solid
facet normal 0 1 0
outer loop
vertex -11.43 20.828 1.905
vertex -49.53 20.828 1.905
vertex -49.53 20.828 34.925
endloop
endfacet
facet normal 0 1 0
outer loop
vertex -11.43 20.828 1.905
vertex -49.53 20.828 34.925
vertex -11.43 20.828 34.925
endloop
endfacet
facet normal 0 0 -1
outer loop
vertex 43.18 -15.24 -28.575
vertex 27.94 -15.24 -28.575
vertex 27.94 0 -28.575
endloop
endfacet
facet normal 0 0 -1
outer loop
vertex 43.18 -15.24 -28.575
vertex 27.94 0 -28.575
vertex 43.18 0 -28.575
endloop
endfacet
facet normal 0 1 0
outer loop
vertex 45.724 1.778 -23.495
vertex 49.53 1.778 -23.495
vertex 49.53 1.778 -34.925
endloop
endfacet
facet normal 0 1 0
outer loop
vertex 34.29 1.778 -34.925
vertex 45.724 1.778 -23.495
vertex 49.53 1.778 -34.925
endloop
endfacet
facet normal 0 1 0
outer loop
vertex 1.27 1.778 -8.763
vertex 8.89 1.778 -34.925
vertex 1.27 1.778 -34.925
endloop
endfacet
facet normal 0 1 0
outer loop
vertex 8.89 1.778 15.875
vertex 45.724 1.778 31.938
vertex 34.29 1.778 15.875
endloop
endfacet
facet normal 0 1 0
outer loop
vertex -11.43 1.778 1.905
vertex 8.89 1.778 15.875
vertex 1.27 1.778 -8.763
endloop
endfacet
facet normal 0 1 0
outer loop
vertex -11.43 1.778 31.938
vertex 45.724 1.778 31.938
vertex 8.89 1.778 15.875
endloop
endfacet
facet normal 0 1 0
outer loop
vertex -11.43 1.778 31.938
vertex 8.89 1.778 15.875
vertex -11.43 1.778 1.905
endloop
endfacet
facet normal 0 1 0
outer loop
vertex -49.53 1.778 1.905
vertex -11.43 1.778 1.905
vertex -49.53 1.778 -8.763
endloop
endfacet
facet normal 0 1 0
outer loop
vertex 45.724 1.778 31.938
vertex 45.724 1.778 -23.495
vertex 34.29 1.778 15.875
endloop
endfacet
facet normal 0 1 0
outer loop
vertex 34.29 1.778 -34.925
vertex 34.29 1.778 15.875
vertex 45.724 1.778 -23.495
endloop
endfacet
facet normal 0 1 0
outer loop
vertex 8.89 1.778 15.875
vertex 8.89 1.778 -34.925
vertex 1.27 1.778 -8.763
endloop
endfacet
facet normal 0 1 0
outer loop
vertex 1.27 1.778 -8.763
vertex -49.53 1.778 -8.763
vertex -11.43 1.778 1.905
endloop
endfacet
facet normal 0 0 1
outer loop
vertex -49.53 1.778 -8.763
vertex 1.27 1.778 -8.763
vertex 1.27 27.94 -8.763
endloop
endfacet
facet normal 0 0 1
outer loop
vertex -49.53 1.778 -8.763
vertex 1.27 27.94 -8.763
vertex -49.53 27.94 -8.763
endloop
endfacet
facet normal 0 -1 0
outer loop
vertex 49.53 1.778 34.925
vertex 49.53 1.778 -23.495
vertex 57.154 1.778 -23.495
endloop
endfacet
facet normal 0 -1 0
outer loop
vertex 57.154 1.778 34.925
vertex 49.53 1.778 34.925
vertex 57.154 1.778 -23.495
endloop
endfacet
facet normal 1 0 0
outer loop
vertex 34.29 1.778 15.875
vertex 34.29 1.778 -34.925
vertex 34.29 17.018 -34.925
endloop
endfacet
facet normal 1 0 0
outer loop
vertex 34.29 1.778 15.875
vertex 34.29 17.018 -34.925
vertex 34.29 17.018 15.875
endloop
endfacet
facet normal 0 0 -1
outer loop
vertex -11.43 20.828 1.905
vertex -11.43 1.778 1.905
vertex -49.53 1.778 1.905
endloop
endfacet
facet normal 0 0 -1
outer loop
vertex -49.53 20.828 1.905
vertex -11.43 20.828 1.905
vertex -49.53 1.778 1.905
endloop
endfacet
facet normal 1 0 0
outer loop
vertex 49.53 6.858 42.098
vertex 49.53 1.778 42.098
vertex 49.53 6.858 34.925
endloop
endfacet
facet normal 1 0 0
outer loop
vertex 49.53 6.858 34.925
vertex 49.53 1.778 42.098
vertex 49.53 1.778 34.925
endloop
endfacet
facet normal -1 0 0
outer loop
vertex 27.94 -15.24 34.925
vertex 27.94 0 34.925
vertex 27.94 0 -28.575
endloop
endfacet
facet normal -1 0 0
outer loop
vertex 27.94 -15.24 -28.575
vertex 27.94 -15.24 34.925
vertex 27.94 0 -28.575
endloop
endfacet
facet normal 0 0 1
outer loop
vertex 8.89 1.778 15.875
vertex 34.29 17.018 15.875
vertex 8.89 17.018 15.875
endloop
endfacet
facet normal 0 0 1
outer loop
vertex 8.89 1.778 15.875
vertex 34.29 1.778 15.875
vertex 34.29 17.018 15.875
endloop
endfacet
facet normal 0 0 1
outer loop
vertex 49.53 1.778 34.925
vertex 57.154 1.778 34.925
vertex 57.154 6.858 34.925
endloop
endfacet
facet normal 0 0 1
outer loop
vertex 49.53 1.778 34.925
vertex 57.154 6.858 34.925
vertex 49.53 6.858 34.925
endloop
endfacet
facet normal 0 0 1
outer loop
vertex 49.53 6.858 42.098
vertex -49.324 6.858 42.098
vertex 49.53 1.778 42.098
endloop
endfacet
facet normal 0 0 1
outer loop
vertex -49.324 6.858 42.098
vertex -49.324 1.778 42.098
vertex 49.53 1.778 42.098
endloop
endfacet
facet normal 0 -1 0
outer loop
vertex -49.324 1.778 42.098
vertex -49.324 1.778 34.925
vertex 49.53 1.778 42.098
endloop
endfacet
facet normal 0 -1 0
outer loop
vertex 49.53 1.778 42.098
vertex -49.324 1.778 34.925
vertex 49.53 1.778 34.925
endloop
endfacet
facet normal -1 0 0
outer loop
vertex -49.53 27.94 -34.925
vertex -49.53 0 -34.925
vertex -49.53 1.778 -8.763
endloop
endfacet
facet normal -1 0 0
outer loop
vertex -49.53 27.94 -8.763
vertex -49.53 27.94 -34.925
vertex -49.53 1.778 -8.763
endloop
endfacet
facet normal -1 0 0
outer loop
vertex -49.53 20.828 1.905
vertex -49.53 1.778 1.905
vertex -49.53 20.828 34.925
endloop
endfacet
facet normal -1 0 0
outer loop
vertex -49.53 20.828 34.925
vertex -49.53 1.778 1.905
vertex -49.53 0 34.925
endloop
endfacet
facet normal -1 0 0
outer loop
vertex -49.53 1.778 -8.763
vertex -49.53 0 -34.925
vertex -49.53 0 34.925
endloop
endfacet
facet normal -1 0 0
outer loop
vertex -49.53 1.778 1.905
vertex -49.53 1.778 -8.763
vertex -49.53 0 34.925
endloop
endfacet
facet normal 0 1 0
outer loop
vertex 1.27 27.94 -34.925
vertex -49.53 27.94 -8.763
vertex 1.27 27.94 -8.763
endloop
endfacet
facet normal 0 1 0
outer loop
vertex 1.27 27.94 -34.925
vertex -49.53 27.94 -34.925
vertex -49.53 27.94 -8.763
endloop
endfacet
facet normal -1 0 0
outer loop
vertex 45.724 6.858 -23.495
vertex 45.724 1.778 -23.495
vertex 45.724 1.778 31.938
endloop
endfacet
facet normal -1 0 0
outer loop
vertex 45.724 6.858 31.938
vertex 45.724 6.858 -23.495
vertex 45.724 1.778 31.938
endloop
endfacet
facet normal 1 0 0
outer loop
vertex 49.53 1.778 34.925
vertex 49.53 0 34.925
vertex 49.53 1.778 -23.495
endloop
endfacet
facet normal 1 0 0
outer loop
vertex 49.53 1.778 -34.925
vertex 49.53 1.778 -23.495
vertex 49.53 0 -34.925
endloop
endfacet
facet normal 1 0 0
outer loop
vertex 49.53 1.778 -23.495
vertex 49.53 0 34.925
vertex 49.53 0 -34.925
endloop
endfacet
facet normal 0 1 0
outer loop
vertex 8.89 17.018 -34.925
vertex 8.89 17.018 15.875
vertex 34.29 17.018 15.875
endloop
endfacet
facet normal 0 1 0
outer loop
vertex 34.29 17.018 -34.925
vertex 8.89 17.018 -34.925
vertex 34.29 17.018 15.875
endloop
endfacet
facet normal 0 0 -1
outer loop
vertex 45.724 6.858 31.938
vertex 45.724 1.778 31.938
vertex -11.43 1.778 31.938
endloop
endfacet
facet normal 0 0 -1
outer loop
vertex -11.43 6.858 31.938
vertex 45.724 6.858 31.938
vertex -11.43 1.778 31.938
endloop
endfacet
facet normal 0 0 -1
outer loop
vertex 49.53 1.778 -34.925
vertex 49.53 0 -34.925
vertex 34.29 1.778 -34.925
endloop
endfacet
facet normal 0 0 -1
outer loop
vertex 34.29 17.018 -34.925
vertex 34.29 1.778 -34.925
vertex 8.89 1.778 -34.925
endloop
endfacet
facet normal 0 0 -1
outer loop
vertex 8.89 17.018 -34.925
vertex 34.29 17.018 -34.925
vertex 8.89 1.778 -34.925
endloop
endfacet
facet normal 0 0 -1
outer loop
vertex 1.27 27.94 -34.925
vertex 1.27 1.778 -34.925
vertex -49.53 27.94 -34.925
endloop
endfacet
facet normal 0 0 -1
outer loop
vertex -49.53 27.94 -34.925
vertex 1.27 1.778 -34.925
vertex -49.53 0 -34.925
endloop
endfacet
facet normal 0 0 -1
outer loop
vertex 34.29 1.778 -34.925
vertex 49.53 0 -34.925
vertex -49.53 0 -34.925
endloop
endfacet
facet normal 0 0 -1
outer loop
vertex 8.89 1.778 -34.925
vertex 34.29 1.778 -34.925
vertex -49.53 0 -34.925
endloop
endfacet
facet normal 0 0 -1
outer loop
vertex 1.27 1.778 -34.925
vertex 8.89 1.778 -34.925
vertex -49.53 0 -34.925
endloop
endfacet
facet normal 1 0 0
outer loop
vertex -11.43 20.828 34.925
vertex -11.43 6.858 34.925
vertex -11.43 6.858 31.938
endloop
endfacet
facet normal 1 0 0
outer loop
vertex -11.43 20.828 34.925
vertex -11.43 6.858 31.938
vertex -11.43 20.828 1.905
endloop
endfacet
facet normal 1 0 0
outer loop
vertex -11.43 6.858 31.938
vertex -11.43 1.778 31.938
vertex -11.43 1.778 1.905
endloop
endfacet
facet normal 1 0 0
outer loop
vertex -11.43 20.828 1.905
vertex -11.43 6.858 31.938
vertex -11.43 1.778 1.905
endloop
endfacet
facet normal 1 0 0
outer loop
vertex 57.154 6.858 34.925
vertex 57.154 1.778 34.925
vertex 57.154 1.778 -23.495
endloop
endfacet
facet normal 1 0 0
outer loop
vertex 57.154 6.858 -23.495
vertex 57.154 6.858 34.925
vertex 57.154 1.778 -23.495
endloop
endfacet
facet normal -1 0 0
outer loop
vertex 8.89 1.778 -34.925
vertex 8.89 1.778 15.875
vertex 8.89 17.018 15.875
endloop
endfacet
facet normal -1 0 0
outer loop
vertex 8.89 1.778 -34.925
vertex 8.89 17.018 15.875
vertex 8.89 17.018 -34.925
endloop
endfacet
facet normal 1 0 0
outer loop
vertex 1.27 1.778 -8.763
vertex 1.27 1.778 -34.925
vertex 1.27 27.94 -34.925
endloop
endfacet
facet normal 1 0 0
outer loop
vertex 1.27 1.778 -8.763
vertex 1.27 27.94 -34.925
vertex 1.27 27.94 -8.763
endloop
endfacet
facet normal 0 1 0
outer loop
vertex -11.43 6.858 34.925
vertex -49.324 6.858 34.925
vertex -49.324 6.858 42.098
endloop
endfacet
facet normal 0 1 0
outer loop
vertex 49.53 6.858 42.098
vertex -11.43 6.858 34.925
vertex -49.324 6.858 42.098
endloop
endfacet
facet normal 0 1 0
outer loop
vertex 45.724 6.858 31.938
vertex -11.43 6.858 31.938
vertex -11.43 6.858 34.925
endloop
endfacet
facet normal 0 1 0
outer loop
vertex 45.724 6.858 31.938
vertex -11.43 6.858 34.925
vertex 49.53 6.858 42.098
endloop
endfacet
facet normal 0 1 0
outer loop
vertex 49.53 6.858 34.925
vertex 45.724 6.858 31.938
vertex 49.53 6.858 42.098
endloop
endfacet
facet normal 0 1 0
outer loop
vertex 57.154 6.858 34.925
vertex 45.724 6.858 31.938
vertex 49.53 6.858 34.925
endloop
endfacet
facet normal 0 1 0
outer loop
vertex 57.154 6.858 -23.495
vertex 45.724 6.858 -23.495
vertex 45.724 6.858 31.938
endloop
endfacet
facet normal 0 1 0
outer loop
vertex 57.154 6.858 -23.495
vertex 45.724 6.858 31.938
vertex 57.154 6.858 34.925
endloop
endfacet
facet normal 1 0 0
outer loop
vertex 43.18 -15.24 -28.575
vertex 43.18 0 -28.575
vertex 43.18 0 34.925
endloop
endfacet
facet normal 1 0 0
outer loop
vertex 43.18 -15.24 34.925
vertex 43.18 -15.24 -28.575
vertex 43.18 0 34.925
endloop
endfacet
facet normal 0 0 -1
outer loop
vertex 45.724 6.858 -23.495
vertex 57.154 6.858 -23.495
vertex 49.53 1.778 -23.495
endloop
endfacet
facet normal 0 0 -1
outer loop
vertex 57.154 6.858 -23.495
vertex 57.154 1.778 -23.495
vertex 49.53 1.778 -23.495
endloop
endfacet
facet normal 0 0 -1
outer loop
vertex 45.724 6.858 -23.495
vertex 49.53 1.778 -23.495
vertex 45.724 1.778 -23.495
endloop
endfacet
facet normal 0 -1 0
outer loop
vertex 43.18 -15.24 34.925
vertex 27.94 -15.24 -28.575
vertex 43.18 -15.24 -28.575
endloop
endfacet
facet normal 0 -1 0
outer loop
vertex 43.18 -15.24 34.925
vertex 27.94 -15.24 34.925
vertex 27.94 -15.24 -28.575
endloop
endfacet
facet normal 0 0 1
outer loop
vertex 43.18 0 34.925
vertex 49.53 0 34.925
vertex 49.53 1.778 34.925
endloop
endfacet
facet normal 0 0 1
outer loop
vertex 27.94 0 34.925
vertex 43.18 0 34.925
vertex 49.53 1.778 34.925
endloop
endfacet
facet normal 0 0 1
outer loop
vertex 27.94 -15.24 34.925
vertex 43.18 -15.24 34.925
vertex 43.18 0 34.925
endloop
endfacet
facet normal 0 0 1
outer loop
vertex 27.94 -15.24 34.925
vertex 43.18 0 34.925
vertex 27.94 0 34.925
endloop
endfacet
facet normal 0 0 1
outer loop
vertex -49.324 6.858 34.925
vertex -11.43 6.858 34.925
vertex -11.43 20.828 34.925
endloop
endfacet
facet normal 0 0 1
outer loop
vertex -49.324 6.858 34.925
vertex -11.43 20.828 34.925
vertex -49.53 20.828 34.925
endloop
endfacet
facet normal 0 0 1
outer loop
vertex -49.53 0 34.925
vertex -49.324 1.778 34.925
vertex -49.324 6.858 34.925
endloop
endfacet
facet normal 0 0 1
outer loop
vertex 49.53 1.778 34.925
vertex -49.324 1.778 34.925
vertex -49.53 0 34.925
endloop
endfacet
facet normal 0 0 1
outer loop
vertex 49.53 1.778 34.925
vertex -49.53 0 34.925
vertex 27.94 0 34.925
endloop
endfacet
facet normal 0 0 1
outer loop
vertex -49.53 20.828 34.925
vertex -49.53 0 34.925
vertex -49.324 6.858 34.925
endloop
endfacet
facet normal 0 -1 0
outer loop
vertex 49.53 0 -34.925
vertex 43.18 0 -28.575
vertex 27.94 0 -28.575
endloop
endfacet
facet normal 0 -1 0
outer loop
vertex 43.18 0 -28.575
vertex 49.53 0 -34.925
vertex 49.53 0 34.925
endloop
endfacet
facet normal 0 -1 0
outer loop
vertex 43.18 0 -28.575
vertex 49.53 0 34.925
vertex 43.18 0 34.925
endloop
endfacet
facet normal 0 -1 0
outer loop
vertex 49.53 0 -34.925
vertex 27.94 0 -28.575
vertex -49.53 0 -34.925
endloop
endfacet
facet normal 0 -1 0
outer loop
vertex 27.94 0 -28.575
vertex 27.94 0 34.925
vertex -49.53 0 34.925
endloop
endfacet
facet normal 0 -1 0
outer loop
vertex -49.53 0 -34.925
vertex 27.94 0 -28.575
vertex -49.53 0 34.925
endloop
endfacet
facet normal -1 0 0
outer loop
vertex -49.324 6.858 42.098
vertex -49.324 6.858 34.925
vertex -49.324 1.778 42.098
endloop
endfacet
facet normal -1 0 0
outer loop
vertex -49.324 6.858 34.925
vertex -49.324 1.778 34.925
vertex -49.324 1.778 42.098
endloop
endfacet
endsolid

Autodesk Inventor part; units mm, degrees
ref_plane "YZ Plane" through (0, 0, 0) normal (1, 0, 0) x (0, 1, 0)
ref_plane "XZ Plane" through (0, 0, 0) normal (0, 1, 0) x (-1, 0, 0)
ref_plane "XY Plane" through (0, 0, 0) normal (0, 0, 1) x (1, 0, 0)
sketch "Sketch1" plane through (0, 0, 0) normal (0, 1, 0) x (-1, 0, 0)
  line L0 (49.53, 34.925) -> (-49.53, 34.925)
  line L1 (-49.53, 34.925) -> (-49.53, -34.925)
  line L2 (-49.53, -34.925) -> (49.53, -34.925)
  line L3 (49.53, -34.925) -> (49.53, 34.925)
  point P0 (0, 0)
  point P1 (0, -34.925)
  point P2 (49.53, 0)
  dimension "d0" = 99.06
  dimension "d1" = 69.85
extrude "Extrusion1" add sketch "Sketch1" along normal blind 1.778
sketch "Sketch2" plane through (0, 1.778, 0) normal (0, 1, 0) x (1, 0, 0)
  line L0 (-49.53, 34.925) -> (-49.53, -34.925) projected
  line L1 (-49.53, 34.925) -> (1.27, 34.925)
  line L2 (1.27, 34.925) -> (1.27, 8.763)
  line L3 (1.27, 8.763) -> (-49.53, 8.763)
  line L4 (-49.53, 8.763) -> (-49.53, 34.925)
  point P0 (0, 0)
  dimension "d4" = 50.8
  dimension "d5" = 26.162
extrude "Extrusion2" add sketch "Sketch2" along normal blind 26.162
sketch "Sketch3" plane through (0, 1.778, 0) normal (0, 1, 0) x (1, 0, 0)
  line L0 (-49.53, 34.925) -> (-49.53, -34.925) projected
  line L1 (-49.53, -34.925) -> (-11.43, -34.925)
  line L2 (-11.43, -34.925) -> (-11.43, -1.905)
  line L3 (-11.43, -1.905) -> (-49.53, -1.905)
  line L4 (-49.53, -1.905) -> (-49.53, -34.925)
  point P0 (0, 0)
  dimension "d8" = 38.1
  dimension "d9" = 33.02
extrude "Extrusion3" add sketch "Sketch3" along normal blind 19.05
sketch "Sketch4" plane through (0, 1.778, 0) normal (0, 1, 0) x (1, 0, 0)
  line L0 (1.27, 34.925) -> (1.27, 8.763) projected
  line L1 (1.27, 34.925) -> (8.89, 34.925)
  line L2 (49.53, 34.925) -> (-49.53, 34.925) projected
  line L3 (8.89, 34.925) -> (34.29, 34.925)
  line L4 (34.29, 34.925) -> (34.29, -15.875)
  line L5 (34.29, -15.875) -> (8.89, -15.875)
  line L6 (8.89, -15.875) -> (8.89, 34.925)
  point P0 (0, 0)
  dimension "d12" = 7.62
  dimension "d13" = 25.4
  dimension "d14" = 50.8
extrude "Extrusion4" add sketch "Sketch4" along normal blind 15.24
sketch "Sketch5" plane through (0, 0, 0) normal (0, -1, 0) x (1, 0, 0)
  line L0 (-11.43, 34.925) -> (49.53, 34.925) projected
  line L1 (49.53, 34.925) -> (43.18, 34.925)
  line L2 (43.18, 34.925) -> (27.94, 34.925)
  line L3 (27.94, 34.925) -> (27.94, -28.575)
  line L4 (27.94, -28.575) -> (43.18, -28.575)
  line L5 (43.18, -28.575) -> (43.18, 34.925)
  point P0 (0, 0)
  dimension "d17" = 6.35
  dimension "d18" = 15.24
  dimension "d19" = 63.5
extrude "Extrusion5" add sketch "Sketch5" along normal blind 15.24
sketch "Sketch6" plane through (0, 1.778, 0) normal (0, 1, 0) x (1, 0, 0)
  line L0 (49.53, -34.925) -> (45.7244, -34.925)
  line L1 (45.7244, -34.925) -> (57.1544, -34.925)
  line L2 (57.1544, -34.925) -> (57.1544, 23.495)
  line L3 (57.1544, 23.495) -> (45.7244, 23.495)
  line L4 (45.7244, 23.495) -> (45.7244, -34.925)
  point P0 (0, 0)
  dimension "d22" = 11.43
  dimension "d23" = 58.42
extrude "Extrusion6" add sketch "Sketch6" along normal blind 5.08
sketch "Sketch7" plane through (0, 1.778, 0) normal (0, 1, 0) x (1, 0, 0)
  line L0 (49.53, -34.925) -> (49.53, 34.925) projected
  line L1 (49.53, -31.9382) -> (-49.3242, -31.9382)
  line L2 (-49.3242, -31.9382) -> (-49.3242, -42.0982)
  line L3 (-49.3242, -42.0982) -> (49.53, -42.0982)
  line L4 (49.53, -42.0982) -> (49.53, -31.9382)
  point P0 (0, 0)
  dimension "d26" = 10.16
extrude "Extrusion7" add sketch "Sketch7" along normal blind 5.08
properties part number "board"
